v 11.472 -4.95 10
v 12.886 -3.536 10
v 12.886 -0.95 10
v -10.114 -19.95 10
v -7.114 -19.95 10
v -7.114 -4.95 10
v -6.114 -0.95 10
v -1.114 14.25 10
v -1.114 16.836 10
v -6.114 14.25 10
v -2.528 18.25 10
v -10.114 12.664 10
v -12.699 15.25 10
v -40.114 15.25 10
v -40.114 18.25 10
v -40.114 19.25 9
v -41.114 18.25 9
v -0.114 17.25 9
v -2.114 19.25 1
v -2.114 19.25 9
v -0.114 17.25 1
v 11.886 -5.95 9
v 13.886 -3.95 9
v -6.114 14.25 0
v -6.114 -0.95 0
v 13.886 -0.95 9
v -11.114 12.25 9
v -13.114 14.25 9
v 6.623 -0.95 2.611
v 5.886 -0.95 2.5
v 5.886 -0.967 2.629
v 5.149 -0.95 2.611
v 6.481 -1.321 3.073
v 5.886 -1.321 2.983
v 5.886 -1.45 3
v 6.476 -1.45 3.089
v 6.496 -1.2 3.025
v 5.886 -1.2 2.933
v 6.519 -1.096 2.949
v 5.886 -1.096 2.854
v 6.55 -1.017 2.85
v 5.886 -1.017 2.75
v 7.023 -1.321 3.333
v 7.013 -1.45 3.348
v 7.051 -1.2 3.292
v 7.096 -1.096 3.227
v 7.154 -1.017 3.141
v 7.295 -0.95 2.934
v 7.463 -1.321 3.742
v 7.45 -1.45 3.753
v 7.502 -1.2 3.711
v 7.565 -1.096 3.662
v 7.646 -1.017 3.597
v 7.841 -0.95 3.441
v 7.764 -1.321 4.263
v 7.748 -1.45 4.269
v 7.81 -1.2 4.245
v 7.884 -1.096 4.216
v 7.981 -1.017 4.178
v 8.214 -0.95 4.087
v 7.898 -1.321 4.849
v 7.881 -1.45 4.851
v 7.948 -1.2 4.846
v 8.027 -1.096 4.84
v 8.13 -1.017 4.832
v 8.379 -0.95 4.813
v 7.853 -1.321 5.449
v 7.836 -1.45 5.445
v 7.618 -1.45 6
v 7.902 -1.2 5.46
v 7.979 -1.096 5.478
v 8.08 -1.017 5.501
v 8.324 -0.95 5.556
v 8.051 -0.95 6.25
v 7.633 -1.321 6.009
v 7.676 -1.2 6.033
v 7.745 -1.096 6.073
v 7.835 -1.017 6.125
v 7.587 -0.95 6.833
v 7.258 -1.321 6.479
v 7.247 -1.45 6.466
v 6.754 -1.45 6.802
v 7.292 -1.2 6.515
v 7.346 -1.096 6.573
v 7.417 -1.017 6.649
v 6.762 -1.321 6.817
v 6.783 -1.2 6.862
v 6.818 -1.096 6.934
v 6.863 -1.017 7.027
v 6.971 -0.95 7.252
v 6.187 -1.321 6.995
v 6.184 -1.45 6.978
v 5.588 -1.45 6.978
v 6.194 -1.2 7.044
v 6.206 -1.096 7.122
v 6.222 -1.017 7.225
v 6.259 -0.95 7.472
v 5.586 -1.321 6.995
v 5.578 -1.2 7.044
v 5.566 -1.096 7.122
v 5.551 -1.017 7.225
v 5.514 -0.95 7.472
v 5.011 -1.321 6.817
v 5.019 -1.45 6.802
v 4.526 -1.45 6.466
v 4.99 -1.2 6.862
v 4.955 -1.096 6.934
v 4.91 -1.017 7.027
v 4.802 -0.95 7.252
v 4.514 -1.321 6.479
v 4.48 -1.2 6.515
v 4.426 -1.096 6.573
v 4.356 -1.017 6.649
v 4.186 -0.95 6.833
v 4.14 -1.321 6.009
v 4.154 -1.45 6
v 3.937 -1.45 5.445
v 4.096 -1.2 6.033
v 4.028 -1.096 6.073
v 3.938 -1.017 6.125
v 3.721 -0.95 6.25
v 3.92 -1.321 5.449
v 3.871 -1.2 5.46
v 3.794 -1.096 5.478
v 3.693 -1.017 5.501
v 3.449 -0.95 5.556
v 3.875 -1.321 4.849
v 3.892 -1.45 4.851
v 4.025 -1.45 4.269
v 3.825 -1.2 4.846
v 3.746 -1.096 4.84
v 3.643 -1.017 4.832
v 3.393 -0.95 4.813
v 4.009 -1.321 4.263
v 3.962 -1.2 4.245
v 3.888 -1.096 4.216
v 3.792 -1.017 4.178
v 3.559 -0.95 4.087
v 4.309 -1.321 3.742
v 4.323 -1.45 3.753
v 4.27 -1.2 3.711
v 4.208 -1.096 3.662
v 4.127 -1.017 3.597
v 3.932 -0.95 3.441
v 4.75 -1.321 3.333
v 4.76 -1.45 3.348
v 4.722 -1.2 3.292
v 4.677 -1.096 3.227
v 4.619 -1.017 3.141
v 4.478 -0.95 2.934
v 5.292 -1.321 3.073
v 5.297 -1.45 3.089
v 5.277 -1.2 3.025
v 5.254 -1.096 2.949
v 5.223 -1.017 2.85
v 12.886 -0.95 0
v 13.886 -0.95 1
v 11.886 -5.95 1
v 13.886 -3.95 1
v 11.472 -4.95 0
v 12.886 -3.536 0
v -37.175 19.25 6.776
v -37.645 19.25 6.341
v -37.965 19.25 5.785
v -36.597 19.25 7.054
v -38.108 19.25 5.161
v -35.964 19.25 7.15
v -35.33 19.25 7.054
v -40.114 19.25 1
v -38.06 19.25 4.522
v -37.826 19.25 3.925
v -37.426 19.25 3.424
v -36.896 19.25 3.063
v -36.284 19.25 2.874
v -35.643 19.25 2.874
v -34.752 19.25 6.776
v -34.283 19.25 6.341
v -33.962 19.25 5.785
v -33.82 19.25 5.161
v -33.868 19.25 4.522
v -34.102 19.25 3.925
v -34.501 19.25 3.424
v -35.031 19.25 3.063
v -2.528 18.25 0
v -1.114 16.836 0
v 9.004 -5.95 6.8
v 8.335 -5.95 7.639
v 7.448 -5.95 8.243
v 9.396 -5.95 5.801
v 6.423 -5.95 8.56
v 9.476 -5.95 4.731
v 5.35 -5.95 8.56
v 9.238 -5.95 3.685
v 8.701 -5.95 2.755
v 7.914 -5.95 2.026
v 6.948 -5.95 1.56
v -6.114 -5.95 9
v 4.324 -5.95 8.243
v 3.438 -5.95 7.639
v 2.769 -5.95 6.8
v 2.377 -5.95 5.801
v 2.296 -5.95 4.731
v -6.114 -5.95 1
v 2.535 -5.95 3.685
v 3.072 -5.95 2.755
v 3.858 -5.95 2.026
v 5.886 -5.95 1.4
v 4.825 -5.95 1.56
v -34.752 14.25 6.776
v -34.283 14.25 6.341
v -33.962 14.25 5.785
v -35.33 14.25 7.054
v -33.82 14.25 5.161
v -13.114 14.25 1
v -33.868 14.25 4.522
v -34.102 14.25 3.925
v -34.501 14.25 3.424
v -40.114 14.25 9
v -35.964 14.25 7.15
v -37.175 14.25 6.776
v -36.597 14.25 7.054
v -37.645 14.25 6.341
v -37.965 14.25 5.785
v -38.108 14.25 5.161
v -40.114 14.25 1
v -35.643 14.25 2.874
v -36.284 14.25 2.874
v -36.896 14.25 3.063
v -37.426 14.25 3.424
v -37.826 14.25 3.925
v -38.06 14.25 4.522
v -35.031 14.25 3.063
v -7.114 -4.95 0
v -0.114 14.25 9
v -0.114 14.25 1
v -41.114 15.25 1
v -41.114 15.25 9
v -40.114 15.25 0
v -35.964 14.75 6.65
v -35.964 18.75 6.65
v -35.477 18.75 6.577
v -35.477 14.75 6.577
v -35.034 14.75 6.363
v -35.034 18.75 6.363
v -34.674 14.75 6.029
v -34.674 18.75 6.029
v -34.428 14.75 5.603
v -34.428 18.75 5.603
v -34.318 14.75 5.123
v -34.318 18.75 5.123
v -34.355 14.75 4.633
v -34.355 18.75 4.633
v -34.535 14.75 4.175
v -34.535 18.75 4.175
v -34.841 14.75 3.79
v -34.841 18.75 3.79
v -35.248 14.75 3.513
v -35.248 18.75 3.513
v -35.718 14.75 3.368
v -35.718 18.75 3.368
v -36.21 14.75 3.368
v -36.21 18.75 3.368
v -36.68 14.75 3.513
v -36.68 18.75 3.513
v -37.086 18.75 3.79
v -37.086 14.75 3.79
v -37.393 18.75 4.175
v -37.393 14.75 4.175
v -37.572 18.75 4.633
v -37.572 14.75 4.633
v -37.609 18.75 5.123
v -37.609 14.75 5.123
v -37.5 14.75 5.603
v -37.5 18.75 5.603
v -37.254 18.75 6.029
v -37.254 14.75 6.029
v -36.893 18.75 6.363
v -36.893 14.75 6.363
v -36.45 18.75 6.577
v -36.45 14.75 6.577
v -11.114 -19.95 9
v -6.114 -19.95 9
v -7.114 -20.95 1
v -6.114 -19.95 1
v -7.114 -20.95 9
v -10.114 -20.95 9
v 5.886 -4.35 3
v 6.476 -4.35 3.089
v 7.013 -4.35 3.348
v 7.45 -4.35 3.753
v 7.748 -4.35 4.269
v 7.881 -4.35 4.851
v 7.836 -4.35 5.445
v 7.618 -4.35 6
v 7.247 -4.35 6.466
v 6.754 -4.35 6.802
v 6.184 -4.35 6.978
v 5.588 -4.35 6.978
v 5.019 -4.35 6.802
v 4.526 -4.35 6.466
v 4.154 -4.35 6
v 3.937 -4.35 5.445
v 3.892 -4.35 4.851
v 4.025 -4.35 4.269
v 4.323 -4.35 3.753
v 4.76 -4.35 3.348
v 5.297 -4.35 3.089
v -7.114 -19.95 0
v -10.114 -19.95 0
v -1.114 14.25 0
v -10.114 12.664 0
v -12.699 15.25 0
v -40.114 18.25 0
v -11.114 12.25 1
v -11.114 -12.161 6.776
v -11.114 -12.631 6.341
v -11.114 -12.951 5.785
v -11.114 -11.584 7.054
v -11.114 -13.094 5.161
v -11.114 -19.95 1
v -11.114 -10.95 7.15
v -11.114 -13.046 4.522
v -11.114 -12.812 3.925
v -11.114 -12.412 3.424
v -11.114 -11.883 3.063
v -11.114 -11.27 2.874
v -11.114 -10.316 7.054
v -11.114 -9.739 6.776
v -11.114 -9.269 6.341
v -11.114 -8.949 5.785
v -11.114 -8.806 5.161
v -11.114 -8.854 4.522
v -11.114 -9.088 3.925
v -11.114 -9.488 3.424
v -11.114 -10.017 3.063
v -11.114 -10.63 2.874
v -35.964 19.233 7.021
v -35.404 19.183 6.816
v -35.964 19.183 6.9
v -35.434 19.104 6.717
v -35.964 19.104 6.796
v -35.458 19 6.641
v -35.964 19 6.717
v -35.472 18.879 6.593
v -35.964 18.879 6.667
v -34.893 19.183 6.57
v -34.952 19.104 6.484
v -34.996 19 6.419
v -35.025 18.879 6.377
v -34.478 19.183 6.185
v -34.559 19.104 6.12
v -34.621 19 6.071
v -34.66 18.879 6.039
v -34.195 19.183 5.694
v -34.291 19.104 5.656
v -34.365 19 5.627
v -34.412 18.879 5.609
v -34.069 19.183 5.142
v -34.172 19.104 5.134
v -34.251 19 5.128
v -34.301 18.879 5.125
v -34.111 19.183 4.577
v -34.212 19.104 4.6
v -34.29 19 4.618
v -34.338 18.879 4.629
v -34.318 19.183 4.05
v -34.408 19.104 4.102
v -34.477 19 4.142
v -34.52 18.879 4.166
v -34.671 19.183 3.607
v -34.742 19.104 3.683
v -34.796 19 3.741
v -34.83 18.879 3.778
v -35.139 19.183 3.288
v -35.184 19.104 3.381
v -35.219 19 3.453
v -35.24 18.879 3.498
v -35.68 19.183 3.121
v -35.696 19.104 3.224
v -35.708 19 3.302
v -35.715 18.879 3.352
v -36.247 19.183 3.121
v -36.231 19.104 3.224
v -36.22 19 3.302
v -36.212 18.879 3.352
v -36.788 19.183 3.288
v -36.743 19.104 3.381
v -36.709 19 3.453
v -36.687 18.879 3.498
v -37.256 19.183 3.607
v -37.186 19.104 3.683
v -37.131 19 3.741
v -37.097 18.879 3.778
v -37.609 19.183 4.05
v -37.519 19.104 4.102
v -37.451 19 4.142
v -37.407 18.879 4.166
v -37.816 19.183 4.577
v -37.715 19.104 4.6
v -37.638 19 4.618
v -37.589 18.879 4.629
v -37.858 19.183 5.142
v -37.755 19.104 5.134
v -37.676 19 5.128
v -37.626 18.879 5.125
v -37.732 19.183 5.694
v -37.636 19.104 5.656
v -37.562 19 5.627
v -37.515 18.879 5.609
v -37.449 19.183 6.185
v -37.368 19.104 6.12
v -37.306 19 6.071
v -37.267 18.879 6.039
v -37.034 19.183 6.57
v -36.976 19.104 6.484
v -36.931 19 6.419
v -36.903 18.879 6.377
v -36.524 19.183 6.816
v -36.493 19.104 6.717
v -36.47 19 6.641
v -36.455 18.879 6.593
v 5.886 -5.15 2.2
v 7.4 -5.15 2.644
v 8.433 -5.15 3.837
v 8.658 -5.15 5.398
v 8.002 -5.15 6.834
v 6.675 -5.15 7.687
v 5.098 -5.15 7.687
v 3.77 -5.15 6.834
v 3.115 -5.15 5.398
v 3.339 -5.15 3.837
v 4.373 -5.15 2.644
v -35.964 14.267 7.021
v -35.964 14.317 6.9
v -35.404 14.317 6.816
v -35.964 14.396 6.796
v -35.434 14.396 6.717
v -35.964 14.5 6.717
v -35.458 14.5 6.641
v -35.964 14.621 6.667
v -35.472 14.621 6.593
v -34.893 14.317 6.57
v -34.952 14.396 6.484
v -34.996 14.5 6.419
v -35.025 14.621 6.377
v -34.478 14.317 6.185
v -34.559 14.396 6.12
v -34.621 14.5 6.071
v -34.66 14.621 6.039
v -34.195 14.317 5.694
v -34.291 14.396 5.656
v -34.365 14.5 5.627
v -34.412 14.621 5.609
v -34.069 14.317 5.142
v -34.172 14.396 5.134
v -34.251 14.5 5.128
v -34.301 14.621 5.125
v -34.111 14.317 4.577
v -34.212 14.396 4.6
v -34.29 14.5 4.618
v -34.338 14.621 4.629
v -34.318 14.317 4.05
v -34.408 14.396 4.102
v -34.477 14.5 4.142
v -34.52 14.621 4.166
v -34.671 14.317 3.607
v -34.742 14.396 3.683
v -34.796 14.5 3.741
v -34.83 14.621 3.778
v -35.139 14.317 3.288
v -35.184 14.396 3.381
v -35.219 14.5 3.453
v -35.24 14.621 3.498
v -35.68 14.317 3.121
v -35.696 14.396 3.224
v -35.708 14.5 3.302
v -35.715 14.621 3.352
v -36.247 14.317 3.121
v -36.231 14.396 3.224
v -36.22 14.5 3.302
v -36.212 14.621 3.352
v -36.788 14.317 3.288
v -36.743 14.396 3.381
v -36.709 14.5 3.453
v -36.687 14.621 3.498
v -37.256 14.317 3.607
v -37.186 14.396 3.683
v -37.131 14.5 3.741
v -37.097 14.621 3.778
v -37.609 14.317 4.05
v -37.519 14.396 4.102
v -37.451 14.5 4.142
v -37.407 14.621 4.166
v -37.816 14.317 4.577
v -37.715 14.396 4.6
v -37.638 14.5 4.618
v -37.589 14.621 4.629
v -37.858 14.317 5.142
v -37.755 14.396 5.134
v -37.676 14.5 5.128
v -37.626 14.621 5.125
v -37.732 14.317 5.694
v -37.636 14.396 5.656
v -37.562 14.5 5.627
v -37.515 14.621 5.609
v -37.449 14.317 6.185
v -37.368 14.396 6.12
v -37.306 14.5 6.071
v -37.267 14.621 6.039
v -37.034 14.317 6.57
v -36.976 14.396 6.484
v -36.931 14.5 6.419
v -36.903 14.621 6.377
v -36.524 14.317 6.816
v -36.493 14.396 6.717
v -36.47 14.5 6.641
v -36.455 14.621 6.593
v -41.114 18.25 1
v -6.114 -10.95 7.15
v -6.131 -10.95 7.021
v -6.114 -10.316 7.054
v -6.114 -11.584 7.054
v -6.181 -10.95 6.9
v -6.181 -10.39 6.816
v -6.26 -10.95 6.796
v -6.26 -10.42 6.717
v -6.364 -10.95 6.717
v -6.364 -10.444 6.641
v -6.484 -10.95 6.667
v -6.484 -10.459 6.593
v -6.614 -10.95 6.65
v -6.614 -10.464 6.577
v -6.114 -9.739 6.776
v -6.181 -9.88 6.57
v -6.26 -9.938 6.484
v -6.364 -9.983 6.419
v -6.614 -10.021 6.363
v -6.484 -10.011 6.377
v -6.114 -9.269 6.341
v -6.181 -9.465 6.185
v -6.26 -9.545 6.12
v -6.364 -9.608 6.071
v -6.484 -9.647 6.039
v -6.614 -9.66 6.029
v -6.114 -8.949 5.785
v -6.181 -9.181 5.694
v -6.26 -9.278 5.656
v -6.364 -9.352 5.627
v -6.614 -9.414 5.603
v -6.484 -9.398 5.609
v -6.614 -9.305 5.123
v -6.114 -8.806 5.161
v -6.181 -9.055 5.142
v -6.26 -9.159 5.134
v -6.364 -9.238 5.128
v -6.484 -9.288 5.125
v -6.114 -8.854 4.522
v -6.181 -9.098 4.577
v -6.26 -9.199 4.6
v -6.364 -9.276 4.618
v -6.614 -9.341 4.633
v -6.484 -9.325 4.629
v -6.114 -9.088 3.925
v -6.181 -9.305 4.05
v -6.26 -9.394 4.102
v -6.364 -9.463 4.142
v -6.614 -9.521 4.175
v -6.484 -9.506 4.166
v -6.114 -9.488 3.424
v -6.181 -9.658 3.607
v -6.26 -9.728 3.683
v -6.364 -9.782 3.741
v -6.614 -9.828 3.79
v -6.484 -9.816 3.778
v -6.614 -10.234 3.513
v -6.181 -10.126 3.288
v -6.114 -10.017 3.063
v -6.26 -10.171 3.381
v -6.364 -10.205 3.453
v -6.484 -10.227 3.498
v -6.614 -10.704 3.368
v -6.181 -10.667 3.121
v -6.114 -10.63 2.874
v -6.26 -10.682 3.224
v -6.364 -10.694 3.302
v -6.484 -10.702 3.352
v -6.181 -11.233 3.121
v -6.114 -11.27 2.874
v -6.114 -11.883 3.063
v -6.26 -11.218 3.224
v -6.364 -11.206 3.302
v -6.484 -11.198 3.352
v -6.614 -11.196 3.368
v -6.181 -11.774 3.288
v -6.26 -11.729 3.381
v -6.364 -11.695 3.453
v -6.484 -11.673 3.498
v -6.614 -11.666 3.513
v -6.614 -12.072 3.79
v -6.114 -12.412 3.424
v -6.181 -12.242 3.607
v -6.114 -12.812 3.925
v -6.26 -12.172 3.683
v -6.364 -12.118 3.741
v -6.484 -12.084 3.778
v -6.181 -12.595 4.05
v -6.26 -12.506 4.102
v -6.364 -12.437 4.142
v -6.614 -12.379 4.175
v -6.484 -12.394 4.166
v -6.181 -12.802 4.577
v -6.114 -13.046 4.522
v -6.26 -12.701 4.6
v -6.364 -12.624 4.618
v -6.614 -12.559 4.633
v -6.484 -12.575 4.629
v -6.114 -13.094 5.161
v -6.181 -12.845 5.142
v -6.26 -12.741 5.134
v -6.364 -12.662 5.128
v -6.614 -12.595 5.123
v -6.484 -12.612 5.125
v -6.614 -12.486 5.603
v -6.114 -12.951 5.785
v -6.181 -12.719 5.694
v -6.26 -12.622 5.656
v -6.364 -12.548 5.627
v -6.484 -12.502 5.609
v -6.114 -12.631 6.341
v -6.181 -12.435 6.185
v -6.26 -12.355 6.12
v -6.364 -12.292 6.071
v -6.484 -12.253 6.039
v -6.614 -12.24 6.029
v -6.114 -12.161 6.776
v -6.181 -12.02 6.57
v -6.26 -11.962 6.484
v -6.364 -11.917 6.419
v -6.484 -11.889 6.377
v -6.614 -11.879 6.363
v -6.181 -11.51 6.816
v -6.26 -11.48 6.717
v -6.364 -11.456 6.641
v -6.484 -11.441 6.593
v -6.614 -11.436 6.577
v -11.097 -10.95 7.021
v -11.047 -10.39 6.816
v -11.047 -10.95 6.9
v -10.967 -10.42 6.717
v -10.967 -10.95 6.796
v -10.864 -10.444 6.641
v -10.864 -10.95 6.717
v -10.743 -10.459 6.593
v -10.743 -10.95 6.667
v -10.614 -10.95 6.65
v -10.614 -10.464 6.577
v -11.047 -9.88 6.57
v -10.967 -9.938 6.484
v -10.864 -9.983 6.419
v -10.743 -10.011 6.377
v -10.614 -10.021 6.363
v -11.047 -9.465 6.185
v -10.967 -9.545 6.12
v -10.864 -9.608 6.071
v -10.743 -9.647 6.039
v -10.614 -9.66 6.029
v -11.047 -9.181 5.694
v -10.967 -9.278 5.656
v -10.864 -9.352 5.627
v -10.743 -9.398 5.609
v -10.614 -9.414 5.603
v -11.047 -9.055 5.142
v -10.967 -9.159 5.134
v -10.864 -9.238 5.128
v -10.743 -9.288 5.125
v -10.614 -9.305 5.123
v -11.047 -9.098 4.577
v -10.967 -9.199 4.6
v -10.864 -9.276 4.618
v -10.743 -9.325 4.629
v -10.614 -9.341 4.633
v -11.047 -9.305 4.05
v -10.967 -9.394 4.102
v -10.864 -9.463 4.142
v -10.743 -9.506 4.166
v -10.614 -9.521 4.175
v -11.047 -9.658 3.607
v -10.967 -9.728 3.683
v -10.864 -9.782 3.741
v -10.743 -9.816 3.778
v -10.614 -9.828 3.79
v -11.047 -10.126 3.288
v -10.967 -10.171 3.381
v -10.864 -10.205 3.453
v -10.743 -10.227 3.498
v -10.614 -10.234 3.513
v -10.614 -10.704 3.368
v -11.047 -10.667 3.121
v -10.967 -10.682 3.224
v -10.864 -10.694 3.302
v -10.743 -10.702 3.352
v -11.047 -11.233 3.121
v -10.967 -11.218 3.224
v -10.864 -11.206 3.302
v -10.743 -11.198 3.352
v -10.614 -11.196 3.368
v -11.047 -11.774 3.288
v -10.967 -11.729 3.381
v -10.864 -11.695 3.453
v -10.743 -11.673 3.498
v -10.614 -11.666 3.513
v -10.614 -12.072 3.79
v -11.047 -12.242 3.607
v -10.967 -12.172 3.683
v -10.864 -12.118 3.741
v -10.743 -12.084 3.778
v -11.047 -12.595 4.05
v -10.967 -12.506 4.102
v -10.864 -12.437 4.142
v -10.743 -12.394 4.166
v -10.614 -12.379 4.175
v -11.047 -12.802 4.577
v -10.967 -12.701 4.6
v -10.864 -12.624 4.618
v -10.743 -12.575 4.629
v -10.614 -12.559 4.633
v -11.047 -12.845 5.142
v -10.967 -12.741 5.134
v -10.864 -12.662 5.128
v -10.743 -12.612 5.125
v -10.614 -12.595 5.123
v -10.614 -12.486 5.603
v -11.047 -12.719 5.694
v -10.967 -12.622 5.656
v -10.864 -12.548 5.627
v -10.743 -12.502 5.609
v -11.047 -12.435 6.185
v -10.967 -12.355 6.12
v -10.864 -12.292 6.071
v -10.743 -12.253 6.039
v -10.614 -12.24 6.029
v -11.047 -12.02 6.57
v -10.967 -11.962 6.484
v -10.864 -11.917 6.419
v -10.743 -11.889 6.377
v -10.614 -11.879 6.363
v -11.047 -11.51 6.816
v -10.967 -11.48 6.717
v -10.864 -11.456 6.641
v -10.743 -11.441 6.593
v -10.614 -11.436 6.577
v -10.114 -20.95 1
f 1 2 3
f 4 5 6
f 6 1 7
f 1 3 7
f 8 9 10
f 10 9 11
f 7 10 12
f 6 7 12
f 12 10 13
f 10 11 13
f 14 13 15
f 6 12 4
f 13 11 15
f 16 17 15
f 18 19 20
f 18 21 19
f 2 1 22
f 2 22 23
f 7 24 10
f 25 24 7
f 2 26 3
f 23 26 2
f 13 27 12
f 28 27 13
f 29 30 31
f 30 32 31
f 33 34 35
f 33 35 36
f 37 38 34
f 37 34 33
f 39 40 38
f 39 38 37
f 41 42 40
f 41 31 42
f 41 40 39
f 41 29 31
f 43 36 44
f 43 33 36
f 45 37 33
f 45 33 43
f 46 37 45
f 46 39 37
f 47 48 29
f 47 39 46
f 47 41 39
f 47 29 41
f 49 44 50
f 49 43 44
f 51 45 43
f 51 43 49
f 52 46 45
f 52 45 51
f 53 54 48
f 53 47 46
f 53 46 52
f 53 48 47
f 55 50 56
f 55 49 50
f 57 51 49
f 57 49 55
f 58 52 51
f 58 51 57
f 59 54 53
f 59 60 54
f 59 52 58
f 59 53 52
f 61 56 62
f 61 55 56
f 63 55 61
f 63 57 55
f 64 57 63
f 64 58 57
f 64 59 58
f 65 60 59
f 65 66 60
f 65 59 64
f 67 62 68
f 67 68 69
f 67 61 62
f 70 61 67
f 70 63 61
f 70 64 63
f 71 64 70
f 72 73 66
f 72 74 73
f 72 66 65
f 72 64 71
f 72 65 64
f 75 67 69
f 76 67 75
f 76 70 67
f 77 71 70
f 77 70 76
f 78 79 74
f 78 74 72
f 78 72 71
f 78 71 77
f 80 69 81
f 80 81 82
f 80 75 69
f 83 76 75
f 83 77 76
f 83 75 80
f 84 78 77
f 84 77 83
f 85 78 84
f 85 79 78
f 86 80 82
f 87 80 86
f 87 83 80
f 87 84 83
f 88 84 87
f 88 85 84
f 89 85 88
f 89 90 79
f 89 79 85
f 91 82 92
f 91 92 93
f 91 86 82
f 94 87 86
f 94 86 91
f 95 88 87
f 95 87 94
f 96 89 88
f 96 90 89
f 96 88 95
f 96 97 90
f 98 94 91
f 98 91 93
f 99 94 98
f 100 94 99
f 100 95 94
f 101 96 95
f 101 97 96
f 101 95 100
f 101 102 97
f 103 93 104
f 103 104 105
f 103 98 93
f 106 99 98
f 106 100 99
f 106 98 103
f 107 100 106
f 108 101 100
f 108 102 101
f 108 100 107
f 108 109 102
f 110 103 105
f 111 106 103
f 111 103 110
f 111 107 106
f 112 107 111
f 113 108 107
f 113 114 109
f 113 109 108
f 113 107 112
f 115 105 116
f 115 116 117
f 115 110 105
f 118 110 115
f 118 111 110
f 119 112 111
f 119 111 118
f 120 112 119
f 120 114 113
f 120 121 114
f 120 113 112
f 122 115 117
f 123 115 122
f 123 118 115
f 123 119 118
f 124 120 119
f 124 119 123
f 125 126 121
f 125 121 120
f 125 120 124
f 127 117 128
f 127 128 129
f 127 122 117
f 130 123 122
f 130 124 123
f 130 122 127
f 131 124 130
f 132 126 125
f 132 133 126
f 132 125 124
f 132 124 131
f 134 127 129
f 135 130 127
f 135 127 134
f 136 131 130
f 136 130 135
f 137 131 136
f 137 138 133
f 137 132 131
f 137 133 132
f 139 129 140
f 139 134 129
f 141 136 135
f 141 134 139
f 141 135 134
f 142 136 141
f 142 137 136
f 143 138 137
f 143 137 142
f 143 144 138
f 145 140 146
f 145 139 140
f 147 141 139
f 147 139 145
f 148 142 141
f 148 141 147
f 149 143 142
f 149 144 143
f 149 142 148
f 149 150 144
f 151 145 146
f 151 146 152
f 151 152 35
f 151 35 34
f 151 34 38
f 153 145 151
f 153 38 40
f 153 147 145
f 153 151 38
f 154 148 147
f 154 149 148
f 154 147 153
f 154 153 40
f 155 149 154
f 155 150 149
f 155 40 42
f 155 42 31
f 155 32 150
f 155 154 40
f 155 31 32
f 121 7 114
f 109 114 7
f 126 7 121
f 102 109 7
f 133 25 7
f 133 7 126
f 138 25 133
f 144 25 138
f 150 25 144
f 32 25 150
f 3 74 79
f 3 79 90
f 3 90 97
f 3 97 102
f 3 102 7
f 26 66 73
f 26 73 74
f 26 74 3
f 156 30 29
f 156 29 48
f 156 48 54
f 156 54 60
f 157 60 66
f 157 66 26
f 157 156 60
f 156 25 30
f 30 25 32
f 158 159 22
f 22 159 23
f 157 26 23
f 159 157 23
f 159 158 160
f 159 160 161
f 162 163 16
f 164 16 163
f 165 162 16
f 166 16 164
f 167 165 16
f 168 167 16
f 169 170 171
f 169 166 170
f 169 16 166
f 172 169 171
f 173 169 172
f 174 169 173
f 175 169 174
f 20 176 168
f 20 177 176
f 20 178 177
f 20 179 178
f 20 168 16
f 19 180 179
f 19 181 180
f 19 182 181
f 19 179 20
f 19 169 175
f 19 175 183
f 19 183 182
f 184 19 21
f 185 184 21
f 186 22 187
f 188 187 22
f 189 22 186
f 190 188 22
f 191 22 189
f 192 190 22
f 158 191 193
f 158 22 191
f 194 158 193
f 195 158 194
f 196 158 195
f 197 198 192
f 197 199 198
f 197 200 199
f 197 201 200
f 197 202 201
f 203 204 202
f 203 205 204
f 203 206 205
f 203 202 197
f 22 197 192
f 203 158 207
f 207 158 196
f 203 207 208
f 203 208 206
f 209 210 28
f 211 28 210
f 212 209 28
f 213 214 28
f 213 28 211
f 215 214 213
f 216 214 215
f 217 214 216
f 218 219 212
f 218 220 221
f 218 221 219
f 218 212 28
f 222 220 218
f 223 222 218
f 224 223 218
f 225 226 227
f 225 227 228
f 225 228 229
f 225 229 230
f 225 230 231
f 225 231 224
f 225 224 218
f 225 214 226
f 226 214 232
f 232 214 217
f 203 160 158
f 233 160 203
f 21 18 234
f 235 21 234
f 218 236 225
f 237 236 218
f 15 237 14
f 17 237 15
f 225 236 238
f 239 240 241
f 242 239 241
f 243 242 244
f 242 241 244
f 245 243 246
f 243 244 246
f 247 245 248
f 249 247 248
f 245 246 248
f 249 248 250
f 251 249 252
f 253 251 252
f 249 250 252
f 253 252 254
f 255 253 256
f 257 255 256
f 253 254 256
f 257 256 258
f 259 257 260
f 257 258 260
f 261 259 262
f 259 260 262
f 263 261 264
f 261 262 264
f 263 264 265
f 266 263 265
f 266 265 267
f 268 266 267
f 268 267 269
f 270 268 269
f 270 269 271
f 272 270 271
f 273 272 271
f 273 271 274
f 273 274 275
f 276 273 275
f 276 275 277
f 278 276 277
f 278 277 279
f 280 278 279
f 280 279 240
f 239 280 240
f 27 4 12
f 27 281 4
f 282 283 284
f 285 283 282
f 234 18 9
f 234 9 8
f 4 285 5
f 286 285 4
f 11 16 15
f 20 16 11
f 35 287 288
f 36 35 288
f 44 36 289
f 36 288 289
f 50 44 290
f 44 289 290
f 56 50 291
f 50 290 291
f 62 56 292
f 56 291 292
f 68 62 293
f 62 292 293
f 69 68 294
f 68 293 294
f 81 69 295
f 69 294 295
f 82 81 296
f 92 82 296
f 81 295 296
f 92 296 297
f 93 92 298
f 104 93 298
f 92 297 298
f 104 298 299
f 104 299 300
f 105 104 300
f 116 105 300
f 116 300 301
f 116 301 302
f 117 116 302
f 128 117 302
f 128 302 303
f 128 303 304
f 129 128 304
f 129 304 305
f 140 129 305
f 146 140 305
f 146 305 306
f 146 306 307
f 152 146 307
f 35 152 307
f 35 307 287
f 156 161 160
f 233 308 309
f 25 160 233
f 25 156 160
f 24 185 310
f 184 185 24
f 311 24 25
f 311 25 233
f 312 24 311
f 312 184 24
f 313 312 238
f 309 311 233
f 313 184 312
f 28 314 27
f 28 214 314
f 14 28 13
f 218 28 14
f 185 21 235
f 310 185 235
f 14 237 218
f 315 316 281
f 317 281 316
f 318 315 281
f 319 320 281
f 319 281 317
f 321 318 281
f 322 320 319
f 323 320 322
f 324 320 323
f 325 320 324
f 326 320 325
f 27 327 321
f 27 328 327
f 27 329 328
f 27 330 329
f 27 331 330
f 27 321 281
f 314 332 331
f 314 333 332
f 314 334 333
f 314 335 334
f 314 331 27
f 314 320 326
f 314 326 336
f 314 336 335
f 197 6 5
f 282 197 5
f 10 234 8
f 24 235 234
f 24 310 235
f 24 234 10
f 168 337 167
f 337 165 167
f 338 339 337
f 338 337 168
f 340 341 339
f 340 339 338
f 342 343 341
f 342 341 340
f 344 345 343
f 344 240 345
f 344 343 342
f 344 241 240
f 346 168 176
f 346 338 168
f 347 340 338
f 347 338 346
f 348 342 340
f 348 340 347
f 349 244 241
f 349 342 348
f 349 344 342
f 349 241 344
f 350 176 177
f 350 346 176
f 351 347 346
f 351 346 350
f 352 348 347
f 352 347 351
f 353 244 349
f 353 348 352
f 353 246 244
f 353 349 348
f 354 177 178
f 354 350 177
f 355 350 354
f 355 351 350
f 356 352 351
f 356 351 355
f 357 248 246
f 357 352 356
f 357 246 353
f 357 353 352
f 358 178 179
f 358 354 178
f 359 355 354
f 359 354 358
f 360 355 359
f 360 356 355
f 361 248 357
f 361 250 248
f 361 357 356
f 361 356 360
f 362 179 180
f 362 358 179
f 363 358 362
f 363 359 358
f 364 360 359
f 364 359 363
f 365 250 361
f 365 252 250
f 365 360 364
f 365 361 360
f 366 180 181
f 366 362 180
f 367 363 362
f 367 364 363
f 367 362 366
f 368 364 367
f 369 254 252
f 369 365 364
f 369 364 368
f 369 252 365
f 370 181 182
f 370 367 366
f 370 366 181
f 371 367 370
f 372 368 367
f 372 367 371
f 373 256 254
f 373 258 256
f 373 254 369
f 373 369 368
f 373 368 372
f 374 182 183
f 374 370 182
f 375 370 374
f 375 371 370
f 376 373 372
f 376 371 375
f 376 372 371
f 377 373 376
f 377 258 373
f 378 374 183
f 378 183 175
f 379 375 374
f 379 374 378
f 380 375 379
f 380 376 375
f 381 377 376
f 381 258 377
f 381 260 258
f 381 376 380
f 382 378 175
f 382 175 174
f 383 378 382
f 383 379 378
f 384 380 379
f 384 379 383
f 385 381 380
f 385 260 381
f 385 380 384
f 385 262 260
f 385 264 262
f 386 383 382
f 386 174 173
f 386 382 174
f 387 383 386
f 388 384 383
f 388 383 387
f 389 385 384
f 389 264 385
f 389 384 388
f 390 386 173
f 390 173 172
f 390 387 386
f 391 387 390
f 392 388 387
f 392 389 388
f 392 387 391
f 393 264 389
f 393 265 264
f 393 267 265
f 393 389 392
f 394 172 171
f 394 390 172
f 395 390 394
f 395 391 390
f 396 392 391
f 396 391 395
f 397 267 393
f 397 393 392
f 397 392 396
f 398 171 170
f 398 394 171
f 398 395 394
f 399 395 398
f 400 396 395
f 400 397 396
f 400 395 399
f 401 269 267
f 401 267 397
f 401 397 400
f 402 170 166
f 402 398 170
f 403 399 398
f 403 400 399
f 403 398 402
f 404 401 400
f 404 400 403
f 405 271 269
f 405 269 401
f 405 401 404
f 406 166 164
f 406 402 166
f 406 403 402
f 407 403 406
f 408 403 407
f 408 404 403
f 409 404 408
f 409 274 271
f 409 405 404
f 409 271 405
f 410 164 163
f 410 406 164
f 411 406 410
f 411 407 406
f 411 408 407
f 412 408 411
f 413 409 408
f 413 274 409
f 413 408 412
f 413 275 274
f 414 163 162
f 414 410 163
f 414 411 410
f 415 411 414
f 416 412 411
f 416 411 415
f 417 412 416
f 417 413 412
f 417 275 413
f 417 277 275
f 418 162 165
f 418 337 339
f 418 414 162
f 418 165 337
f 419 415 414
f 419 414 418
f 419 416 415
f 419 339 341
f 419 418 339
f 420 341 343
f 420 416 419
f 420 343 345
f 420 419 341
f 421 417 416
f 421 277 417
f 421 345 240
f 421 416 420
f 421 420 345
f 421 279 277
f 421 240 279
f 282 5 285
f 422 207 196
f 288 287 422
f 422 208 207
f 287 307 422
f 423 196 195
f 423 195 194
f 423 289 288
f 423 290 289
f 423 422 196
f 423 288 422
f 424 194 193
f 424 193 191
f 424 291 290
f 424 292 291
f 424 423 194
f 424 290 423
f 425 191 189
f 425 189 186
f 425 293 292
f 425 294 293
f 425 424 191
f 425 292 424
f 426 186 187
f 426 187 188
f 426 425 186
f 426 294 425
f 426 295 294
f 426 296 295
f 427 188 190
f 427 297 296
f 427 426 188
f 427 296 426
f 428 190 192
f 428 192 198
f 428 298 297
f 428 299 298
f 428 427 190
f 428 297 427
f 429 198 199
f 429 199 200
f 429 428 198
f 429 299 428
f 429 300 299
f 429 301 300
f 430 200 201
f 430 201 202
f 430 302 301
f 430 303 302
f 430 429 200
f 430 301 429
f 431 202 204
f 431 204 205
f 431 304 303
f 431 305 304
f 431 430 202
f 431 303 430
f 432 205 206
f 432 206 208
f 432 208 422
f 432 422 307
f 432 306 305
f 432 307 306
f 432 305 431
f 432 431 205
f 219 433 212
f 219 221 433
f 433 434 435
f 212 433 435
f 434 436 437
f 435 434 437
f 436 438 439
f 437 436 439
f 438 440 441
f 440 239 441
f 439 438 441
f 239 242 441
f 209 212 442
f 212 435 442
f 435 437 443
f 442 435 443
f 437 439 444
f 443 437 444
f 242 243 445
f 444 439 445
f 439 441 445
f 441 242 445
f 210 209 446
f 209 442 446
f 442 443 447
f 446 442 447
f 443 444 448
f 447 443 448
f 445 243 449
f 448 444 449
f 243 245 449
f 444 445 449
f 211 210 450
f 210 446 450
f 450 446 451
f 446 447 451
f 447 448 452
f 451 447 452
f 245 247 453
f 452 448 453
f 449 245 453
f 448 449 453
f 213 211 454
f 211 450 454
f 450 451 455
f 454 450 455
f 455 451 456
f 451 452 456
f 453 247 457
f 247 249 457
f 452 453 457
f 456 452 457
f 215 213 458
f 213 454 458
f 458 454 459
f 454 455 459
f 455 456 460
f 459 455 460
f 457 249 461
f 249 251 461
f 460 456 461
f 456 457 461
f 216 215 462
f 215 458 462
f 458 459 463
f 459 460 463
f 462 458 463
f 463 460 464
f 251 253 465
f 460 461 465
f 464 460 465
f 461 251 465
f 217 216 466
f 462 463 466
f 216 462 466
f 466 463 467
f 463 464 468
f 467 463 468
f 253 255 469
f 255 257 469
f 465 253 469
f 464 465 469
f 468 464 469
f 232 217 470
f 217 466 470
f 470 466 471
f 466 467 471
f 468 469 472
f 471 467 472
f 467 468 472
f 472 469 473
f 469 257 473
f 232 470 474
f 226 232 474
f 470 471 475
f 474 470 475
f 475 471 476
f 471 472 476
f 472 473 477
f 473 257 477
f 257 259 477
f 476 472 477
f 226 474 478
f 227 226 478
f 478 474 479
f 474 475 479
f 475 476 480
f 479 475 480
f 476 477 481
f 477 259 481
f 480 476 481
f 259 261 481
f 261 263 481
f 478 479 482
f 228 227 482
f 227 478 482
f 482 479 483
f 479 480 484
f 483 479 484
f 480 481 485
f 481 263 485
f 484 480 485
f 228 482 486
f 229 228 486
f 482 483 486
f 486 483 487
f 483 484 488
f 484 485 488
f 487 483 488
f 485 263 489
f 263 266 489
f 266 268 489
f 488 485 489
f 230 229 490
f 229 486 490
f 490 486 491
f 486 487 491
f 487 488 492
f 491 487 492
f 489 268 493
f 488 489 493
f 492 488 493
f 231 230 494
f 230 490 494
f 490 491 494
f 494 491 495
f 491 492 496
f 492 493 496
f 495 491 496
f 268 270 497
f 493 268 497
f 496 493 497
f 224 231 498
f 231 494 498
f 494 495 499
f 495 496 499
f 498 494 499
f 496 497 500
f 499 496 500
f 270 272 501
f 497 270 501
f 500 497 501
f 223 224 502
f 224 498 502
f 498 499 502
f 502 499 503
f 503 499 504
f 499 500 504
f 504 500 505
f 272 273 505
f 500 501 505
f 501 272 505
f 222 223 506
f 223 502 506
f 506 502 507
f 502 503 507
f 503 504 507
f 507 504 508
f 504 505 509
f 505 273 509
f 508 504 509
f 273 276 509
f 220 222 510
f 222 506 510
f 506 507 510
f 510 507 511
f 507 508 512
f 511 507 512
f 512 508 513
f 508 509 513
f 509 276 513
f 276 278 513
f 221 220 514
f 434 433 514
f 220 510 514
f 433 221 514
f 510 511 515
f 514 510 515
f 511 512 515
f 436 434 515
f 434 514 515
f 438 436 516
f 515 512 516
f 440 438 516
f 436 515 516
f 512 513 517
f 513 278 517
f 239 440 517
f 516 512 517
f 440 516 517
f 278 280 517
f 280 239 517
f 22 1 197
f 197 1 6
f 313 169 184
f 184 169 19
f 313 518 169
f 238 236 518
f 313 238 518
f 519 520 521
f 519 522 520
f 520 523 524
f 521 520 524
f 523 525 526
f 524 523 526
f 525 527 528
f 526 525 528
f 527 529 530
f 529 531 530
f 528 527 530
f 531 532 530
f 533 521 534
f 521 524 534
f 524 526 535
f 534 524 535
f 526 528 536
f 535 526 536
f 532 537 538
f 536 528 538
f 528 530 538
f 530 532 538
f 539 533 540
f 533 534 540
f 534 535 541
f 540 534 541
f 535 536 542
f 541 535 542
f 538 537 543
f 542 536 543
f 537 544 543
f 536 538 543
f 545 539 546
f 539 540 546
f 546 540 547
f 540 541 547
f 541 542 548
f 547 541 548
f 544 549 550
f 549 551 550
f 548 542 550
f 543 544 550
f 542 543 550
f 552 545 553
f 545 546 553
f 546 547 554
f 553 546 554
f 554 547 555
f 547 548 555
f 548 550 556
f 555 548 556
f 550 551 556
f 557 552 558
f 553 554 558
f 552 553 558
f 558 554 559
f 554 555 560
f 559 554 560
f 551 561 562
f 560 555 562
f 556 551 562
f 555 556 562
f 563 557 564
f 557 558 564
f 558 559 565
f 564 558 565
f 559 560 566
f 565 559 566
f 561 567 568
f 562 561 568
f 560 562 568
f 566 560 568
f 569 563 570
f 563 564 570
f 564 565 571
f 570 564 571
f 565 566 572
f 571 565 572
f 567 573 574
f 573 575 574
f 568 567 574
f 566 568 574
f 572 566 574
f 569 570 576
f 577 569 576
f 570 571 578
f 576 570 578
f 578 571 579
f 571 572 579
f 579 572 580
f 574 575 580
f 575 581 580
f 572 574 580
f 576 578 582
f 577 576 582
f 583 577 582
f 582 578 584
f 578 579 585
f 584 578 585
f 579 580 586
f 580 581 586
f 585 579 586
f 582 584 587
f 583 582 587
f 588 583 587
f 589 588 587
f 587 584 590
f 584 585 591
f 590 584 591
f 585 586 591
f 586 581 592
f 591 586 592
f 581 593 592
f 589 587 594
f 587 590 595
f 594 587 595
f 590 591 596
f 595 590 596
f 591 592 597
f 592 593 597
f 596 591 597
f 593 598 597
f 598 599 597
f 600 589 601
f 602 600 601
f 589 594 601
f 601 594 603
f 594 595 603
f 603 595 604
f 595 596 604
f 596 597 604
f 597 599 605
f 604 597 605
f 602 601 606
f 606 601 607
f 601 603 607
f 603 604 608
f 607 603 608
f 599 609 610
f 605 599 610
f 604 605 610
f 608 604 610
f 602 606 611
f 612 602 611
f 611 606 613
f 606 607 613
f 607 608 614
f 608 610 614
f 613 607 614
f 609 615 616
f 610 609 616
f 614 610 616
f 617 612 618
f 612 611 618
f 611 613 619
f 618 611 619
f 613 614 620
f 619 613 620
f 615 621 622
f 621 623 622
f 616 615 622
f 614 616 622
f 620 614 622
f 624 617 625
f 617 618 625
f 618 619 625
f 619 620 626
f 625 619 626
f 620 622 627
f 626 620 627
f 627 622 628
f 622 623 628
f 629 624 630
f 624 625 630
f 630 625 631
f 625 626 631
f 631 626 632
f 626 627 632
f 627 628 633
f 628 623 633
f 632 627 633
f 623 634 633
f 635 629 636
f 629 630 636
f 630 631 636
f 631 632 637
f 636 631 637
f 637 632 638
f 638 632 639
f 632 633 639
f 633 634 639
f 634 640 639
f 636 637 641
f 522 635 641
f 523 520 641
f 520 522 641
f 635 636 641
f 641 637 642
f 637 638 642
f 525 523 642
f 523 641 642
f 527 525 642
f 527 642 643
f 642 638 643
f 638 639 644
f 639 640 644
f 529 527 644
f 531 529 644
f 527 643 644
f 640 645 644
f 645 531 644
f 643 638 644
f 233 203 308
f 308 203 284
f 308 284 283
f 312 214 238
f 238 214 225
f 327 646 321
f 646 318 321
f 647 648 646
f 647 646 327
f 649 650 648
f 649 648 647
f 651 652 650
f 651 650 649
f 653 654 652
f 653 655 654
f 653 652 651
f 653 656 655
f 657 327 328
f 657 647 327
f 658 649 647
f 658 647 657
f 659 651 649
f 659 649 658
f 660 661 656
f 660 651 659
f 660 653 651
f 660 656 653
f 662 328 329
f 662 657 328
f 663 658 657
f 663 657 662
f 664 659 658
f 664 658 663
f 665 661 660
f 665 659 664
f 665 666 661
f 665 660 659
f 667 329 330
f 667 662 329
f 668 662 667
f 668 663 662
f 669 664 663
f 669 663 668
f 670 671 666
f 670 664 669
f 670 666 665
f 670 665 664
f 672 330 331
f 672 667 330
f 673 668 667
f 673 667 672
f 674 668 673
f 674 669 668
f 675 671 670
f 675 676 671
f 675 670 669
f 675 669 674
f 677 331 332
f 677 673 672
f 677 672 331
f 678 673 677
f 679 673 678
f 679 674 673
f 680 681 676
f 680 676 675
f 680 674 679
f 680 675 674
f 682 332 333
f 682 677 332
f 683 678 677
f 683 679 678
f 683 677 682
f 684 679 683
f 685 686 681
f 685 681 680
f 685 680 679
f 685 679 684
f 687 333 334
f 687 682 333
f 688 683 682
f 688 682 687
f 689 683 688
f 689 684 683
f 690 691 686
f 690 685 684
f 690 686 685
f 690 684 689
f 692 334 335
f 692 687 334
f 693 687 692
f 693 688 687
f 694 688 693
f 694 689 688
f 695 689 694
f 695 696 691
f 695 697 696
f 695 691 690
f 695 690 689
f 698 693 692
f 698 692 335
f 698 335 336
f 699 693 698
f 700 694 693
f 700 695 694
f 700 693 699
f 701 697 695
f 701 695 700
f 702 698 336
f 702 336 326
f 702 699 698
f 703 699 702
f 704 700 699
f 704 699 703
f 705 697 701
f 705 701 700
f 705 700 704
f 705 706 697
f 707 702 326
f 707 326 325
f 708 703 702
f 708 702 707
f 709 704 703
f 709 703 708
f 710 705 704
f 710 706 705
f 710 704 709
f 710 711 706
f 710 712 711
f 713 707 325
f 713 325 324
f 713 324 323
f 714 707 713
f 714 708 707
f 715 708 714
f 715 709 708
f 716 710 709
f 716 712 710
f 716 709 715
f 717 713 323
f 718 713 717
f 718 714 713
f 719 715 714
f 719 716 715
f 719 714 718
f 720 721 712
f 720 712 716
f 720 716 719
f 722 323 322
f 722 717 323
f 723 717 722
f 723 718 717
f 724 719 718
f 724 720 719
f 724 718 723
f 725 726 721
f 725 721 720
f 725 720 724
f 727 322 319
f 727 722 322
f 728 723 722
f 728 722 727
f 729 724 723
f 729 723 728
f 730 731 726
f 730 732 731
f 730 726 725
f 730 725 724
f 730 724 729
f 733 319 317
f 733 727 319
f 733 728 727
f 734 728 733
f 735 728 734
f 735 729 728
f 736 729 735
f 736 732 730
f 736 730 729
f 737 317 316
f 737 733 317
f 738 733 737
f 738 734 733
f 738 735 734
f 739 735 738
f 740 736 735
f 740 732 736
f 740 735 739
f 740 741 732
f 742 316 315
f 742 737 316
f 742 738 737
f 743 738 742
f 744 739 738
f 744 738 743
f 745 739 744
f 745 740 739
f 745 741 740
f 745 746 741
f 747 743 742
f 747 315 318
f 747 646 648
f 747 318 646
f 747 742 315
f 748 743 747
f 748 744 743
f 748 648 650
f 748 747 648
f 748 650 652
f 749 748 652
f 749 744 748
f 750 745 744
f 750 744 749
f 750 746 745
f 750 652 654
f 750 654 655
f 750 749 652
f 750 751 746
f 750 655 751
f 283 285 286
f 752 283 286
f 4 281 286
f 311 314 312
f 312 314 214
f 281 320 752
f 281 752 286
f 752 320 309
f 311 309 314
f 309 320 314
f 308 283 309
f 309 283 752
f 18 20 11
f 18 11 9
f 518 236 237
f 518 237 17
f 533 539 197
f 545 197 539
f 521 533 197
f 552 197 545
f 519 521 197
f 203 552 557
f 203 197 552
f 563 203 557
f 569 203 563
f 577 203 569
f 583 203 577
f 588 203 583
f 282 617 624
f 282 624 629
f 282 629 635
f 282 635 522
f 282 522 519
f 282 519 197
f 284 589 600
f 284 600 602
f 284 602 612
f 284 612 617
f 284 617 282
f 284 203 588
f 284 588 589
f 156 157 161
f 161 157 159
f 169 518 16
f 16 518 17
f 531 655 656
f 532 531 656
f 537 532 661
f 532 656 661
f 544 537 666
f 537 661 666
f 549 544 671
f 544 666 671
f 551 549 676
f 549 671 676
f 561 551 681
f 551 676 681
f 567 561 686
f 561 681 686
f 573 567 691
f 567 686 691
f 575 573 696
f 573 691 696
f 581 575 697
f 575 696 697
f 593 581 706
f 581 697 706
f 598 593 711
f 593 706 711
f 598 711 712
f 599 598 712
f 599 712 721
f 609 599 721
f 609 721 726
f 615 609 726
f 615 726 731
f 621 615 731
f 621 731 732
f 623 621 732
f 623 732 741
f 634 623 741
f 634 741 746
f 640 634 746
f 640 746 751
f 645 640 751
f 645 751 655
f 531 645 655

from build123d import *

# Parameters (mm, degrees)
RESSALTO_EXTRUS_O1_DEPTH = 10
ESBO_O3_R                = 2
CORTE_EXTRUS_O1_DEPTH    = 15
CHANFRO1_SIZE            = 1.6
FILETE1_R                = 0.5
CHANFRO5_SIZE            = 2
CHANFRO8_SIZE            = 1
ESBO_O4_R                = 1.65
CORTE_EXTRUS_O2_DEPTH    = 10
FILETE2_R                = 0.5
ESBO_O5_R                = 1.65
CORTE_EXTRUS_O3_DEPTH    = 10
FILETE3_R                = 0.5


with BuildPart() as part:
    # Esboço1 → Ressalto-extrusão1 (new body)
    with BuildSketch(Plane.XY):
        Polygon((-0.113617837, 14.25), (-6.113617837, 14.25), (-6.113617837, -0.95), (13.886382163, -0.95), (13.886382163, -5.95), (-6.113617837, -5.95), (-6.113617837, -20.95), (-11.113617837, -20.95), (-11.113617837, 14.25), (-41.113617837, 14.25), (-41.113617837, 19.25), (-0.113617837, 19.25), align=None)
    extrude(amount=RESSALTO_EXTRUS_O1_DEPTH)

    # Esboço3 → Corte-extrusão1 (cut)
    with BuildSketch(Plane.XZ.offset(5.95)):
        with Locations(Location((5.886382163, 5, 0), (0, 0, 270))):
            Circle(ESBO_O3_R)
    extrude(amount=-CORTE_EXTRUS_O1_DEPTH, mode=Mode.SUBTRACT)

    # Chanfro1
    chanfro1_edges = [part.edges().sort_by_distance(p)[0] for p in [
        (5.886382163, -5.95, 7),
    ]]
    chamfer(chanfro1_edges, length=CHANFRO1_SIZE)

    # Filete1
    filete1_edges = [part.edges().sort_by_distance(p)[0] for p in [
        (5.886382163, -0.95, 7),
    ]]
    fillet(filete1_edges, radius=FILETE1_R)

    # Chanfro5
    chanfro5_edges = [part.edges().sort_by_distance(p)[0] for p in [
        (13.886382163, -5.95, 5),
        (-11.113617837, 14.25, 5),
        (-0.113617837, 19.25, 5),
    ]]
    chamfer(chanfro5_edges, length=CHANFRO5_SIZE)

    # Chanfro8
    chanfro8_edges = [part.edges().sort_by_distance(p)[0] for p in [
        (-41.113617837, 19.25, 5),
        (-41.113617837, 16.75, 10),
        (-41.113617837, 14.25, 5),
        (-41.113617837, 16.75, 0),
        (-0.113617837, 15.75, 0),
        (-21.613617837, 19.25, 0),
        (13.886382163, -2.45, 0),
        (12.886382163, -4.95, 0),
        (2.886382163, -5.95, 0),
        (-11.113617837, -4.35, 0),
        (-12.113617837, 13.25, 0),
        (-27.113617837, 14.25, 0),
        (13.886382163, -2.45, 10),
        (12.886382163, -4.95, 10),
        (2.886382163, -5.95, 10),
        (-11.113617837, -4.35, 10),
        (-12.113617837, 13.25, 10),
        (-27.113617837, 14.25, 10),
        (-0.113617837, 15.75, 10),
        (-21.613617837, 19.25, 10),
        (-1.113617837, 18.25, 0),
        (-1.113617837, 18.25, 10),
        (-11.113617837, -20.95, 5),
        (-8.613617837, -20.95, 10),
        (-6.113617837, -13.45, 10),
        (-6.113617837, -20.95, 5),
        (-6.113617837, -13.45, 0),
        (-8.613617837, -20.95, 0),
    ]]
    chamfer(chanfro8_edges, length=CHANFRO8_SIZE)

    # Esboço4 → Corte-extrusão2 (cut)
    with BuildSketch(Plane(origin=(0, 19.25, 0), x_dir=(1, 0, 0), z_dir=(0, 1, 0))):
        with Locations(Location((-35.963617837, -5, 0), (0, 0, 270))):
            Circle(ESBO_O4_R)
    extrude(amount=-CORTE_EXTRUS_O2_DEPTH, mode=Mode.SUBTRACT)

    # Filete2
    filete2_edges = [part.edges().sort_by_distance(p)[0] for p in [
        (-35.963617837, 14.25, 3.35),
        (-35.963617837, 19.25, 3.35),
    ]]
    fillet(filete2_edges, radius=FILETE2_R)

    # Esboço5 → Corte-extrusão3 (cut)
    with BuildSketch(Plane.ZY.offset(11.113617837)):
        with Locations((5, -10.95)):
            Circle(ESBO_O5_R)
    extrude(amount=-CORTE_EXTRUS_O3_DEPTH, mode=Mode.SUBTRACT)

    # Filete3
    filete3_edges = [part.edges().sort_by_distance(p)[0] for p in [
        (-6.113617837, -10.95, 3.35),
        (-11.113617837, -10.95, 3.35),
    ]]
    fillet(filete3_edges, radius=FILETE3_R)


solid = part.part
